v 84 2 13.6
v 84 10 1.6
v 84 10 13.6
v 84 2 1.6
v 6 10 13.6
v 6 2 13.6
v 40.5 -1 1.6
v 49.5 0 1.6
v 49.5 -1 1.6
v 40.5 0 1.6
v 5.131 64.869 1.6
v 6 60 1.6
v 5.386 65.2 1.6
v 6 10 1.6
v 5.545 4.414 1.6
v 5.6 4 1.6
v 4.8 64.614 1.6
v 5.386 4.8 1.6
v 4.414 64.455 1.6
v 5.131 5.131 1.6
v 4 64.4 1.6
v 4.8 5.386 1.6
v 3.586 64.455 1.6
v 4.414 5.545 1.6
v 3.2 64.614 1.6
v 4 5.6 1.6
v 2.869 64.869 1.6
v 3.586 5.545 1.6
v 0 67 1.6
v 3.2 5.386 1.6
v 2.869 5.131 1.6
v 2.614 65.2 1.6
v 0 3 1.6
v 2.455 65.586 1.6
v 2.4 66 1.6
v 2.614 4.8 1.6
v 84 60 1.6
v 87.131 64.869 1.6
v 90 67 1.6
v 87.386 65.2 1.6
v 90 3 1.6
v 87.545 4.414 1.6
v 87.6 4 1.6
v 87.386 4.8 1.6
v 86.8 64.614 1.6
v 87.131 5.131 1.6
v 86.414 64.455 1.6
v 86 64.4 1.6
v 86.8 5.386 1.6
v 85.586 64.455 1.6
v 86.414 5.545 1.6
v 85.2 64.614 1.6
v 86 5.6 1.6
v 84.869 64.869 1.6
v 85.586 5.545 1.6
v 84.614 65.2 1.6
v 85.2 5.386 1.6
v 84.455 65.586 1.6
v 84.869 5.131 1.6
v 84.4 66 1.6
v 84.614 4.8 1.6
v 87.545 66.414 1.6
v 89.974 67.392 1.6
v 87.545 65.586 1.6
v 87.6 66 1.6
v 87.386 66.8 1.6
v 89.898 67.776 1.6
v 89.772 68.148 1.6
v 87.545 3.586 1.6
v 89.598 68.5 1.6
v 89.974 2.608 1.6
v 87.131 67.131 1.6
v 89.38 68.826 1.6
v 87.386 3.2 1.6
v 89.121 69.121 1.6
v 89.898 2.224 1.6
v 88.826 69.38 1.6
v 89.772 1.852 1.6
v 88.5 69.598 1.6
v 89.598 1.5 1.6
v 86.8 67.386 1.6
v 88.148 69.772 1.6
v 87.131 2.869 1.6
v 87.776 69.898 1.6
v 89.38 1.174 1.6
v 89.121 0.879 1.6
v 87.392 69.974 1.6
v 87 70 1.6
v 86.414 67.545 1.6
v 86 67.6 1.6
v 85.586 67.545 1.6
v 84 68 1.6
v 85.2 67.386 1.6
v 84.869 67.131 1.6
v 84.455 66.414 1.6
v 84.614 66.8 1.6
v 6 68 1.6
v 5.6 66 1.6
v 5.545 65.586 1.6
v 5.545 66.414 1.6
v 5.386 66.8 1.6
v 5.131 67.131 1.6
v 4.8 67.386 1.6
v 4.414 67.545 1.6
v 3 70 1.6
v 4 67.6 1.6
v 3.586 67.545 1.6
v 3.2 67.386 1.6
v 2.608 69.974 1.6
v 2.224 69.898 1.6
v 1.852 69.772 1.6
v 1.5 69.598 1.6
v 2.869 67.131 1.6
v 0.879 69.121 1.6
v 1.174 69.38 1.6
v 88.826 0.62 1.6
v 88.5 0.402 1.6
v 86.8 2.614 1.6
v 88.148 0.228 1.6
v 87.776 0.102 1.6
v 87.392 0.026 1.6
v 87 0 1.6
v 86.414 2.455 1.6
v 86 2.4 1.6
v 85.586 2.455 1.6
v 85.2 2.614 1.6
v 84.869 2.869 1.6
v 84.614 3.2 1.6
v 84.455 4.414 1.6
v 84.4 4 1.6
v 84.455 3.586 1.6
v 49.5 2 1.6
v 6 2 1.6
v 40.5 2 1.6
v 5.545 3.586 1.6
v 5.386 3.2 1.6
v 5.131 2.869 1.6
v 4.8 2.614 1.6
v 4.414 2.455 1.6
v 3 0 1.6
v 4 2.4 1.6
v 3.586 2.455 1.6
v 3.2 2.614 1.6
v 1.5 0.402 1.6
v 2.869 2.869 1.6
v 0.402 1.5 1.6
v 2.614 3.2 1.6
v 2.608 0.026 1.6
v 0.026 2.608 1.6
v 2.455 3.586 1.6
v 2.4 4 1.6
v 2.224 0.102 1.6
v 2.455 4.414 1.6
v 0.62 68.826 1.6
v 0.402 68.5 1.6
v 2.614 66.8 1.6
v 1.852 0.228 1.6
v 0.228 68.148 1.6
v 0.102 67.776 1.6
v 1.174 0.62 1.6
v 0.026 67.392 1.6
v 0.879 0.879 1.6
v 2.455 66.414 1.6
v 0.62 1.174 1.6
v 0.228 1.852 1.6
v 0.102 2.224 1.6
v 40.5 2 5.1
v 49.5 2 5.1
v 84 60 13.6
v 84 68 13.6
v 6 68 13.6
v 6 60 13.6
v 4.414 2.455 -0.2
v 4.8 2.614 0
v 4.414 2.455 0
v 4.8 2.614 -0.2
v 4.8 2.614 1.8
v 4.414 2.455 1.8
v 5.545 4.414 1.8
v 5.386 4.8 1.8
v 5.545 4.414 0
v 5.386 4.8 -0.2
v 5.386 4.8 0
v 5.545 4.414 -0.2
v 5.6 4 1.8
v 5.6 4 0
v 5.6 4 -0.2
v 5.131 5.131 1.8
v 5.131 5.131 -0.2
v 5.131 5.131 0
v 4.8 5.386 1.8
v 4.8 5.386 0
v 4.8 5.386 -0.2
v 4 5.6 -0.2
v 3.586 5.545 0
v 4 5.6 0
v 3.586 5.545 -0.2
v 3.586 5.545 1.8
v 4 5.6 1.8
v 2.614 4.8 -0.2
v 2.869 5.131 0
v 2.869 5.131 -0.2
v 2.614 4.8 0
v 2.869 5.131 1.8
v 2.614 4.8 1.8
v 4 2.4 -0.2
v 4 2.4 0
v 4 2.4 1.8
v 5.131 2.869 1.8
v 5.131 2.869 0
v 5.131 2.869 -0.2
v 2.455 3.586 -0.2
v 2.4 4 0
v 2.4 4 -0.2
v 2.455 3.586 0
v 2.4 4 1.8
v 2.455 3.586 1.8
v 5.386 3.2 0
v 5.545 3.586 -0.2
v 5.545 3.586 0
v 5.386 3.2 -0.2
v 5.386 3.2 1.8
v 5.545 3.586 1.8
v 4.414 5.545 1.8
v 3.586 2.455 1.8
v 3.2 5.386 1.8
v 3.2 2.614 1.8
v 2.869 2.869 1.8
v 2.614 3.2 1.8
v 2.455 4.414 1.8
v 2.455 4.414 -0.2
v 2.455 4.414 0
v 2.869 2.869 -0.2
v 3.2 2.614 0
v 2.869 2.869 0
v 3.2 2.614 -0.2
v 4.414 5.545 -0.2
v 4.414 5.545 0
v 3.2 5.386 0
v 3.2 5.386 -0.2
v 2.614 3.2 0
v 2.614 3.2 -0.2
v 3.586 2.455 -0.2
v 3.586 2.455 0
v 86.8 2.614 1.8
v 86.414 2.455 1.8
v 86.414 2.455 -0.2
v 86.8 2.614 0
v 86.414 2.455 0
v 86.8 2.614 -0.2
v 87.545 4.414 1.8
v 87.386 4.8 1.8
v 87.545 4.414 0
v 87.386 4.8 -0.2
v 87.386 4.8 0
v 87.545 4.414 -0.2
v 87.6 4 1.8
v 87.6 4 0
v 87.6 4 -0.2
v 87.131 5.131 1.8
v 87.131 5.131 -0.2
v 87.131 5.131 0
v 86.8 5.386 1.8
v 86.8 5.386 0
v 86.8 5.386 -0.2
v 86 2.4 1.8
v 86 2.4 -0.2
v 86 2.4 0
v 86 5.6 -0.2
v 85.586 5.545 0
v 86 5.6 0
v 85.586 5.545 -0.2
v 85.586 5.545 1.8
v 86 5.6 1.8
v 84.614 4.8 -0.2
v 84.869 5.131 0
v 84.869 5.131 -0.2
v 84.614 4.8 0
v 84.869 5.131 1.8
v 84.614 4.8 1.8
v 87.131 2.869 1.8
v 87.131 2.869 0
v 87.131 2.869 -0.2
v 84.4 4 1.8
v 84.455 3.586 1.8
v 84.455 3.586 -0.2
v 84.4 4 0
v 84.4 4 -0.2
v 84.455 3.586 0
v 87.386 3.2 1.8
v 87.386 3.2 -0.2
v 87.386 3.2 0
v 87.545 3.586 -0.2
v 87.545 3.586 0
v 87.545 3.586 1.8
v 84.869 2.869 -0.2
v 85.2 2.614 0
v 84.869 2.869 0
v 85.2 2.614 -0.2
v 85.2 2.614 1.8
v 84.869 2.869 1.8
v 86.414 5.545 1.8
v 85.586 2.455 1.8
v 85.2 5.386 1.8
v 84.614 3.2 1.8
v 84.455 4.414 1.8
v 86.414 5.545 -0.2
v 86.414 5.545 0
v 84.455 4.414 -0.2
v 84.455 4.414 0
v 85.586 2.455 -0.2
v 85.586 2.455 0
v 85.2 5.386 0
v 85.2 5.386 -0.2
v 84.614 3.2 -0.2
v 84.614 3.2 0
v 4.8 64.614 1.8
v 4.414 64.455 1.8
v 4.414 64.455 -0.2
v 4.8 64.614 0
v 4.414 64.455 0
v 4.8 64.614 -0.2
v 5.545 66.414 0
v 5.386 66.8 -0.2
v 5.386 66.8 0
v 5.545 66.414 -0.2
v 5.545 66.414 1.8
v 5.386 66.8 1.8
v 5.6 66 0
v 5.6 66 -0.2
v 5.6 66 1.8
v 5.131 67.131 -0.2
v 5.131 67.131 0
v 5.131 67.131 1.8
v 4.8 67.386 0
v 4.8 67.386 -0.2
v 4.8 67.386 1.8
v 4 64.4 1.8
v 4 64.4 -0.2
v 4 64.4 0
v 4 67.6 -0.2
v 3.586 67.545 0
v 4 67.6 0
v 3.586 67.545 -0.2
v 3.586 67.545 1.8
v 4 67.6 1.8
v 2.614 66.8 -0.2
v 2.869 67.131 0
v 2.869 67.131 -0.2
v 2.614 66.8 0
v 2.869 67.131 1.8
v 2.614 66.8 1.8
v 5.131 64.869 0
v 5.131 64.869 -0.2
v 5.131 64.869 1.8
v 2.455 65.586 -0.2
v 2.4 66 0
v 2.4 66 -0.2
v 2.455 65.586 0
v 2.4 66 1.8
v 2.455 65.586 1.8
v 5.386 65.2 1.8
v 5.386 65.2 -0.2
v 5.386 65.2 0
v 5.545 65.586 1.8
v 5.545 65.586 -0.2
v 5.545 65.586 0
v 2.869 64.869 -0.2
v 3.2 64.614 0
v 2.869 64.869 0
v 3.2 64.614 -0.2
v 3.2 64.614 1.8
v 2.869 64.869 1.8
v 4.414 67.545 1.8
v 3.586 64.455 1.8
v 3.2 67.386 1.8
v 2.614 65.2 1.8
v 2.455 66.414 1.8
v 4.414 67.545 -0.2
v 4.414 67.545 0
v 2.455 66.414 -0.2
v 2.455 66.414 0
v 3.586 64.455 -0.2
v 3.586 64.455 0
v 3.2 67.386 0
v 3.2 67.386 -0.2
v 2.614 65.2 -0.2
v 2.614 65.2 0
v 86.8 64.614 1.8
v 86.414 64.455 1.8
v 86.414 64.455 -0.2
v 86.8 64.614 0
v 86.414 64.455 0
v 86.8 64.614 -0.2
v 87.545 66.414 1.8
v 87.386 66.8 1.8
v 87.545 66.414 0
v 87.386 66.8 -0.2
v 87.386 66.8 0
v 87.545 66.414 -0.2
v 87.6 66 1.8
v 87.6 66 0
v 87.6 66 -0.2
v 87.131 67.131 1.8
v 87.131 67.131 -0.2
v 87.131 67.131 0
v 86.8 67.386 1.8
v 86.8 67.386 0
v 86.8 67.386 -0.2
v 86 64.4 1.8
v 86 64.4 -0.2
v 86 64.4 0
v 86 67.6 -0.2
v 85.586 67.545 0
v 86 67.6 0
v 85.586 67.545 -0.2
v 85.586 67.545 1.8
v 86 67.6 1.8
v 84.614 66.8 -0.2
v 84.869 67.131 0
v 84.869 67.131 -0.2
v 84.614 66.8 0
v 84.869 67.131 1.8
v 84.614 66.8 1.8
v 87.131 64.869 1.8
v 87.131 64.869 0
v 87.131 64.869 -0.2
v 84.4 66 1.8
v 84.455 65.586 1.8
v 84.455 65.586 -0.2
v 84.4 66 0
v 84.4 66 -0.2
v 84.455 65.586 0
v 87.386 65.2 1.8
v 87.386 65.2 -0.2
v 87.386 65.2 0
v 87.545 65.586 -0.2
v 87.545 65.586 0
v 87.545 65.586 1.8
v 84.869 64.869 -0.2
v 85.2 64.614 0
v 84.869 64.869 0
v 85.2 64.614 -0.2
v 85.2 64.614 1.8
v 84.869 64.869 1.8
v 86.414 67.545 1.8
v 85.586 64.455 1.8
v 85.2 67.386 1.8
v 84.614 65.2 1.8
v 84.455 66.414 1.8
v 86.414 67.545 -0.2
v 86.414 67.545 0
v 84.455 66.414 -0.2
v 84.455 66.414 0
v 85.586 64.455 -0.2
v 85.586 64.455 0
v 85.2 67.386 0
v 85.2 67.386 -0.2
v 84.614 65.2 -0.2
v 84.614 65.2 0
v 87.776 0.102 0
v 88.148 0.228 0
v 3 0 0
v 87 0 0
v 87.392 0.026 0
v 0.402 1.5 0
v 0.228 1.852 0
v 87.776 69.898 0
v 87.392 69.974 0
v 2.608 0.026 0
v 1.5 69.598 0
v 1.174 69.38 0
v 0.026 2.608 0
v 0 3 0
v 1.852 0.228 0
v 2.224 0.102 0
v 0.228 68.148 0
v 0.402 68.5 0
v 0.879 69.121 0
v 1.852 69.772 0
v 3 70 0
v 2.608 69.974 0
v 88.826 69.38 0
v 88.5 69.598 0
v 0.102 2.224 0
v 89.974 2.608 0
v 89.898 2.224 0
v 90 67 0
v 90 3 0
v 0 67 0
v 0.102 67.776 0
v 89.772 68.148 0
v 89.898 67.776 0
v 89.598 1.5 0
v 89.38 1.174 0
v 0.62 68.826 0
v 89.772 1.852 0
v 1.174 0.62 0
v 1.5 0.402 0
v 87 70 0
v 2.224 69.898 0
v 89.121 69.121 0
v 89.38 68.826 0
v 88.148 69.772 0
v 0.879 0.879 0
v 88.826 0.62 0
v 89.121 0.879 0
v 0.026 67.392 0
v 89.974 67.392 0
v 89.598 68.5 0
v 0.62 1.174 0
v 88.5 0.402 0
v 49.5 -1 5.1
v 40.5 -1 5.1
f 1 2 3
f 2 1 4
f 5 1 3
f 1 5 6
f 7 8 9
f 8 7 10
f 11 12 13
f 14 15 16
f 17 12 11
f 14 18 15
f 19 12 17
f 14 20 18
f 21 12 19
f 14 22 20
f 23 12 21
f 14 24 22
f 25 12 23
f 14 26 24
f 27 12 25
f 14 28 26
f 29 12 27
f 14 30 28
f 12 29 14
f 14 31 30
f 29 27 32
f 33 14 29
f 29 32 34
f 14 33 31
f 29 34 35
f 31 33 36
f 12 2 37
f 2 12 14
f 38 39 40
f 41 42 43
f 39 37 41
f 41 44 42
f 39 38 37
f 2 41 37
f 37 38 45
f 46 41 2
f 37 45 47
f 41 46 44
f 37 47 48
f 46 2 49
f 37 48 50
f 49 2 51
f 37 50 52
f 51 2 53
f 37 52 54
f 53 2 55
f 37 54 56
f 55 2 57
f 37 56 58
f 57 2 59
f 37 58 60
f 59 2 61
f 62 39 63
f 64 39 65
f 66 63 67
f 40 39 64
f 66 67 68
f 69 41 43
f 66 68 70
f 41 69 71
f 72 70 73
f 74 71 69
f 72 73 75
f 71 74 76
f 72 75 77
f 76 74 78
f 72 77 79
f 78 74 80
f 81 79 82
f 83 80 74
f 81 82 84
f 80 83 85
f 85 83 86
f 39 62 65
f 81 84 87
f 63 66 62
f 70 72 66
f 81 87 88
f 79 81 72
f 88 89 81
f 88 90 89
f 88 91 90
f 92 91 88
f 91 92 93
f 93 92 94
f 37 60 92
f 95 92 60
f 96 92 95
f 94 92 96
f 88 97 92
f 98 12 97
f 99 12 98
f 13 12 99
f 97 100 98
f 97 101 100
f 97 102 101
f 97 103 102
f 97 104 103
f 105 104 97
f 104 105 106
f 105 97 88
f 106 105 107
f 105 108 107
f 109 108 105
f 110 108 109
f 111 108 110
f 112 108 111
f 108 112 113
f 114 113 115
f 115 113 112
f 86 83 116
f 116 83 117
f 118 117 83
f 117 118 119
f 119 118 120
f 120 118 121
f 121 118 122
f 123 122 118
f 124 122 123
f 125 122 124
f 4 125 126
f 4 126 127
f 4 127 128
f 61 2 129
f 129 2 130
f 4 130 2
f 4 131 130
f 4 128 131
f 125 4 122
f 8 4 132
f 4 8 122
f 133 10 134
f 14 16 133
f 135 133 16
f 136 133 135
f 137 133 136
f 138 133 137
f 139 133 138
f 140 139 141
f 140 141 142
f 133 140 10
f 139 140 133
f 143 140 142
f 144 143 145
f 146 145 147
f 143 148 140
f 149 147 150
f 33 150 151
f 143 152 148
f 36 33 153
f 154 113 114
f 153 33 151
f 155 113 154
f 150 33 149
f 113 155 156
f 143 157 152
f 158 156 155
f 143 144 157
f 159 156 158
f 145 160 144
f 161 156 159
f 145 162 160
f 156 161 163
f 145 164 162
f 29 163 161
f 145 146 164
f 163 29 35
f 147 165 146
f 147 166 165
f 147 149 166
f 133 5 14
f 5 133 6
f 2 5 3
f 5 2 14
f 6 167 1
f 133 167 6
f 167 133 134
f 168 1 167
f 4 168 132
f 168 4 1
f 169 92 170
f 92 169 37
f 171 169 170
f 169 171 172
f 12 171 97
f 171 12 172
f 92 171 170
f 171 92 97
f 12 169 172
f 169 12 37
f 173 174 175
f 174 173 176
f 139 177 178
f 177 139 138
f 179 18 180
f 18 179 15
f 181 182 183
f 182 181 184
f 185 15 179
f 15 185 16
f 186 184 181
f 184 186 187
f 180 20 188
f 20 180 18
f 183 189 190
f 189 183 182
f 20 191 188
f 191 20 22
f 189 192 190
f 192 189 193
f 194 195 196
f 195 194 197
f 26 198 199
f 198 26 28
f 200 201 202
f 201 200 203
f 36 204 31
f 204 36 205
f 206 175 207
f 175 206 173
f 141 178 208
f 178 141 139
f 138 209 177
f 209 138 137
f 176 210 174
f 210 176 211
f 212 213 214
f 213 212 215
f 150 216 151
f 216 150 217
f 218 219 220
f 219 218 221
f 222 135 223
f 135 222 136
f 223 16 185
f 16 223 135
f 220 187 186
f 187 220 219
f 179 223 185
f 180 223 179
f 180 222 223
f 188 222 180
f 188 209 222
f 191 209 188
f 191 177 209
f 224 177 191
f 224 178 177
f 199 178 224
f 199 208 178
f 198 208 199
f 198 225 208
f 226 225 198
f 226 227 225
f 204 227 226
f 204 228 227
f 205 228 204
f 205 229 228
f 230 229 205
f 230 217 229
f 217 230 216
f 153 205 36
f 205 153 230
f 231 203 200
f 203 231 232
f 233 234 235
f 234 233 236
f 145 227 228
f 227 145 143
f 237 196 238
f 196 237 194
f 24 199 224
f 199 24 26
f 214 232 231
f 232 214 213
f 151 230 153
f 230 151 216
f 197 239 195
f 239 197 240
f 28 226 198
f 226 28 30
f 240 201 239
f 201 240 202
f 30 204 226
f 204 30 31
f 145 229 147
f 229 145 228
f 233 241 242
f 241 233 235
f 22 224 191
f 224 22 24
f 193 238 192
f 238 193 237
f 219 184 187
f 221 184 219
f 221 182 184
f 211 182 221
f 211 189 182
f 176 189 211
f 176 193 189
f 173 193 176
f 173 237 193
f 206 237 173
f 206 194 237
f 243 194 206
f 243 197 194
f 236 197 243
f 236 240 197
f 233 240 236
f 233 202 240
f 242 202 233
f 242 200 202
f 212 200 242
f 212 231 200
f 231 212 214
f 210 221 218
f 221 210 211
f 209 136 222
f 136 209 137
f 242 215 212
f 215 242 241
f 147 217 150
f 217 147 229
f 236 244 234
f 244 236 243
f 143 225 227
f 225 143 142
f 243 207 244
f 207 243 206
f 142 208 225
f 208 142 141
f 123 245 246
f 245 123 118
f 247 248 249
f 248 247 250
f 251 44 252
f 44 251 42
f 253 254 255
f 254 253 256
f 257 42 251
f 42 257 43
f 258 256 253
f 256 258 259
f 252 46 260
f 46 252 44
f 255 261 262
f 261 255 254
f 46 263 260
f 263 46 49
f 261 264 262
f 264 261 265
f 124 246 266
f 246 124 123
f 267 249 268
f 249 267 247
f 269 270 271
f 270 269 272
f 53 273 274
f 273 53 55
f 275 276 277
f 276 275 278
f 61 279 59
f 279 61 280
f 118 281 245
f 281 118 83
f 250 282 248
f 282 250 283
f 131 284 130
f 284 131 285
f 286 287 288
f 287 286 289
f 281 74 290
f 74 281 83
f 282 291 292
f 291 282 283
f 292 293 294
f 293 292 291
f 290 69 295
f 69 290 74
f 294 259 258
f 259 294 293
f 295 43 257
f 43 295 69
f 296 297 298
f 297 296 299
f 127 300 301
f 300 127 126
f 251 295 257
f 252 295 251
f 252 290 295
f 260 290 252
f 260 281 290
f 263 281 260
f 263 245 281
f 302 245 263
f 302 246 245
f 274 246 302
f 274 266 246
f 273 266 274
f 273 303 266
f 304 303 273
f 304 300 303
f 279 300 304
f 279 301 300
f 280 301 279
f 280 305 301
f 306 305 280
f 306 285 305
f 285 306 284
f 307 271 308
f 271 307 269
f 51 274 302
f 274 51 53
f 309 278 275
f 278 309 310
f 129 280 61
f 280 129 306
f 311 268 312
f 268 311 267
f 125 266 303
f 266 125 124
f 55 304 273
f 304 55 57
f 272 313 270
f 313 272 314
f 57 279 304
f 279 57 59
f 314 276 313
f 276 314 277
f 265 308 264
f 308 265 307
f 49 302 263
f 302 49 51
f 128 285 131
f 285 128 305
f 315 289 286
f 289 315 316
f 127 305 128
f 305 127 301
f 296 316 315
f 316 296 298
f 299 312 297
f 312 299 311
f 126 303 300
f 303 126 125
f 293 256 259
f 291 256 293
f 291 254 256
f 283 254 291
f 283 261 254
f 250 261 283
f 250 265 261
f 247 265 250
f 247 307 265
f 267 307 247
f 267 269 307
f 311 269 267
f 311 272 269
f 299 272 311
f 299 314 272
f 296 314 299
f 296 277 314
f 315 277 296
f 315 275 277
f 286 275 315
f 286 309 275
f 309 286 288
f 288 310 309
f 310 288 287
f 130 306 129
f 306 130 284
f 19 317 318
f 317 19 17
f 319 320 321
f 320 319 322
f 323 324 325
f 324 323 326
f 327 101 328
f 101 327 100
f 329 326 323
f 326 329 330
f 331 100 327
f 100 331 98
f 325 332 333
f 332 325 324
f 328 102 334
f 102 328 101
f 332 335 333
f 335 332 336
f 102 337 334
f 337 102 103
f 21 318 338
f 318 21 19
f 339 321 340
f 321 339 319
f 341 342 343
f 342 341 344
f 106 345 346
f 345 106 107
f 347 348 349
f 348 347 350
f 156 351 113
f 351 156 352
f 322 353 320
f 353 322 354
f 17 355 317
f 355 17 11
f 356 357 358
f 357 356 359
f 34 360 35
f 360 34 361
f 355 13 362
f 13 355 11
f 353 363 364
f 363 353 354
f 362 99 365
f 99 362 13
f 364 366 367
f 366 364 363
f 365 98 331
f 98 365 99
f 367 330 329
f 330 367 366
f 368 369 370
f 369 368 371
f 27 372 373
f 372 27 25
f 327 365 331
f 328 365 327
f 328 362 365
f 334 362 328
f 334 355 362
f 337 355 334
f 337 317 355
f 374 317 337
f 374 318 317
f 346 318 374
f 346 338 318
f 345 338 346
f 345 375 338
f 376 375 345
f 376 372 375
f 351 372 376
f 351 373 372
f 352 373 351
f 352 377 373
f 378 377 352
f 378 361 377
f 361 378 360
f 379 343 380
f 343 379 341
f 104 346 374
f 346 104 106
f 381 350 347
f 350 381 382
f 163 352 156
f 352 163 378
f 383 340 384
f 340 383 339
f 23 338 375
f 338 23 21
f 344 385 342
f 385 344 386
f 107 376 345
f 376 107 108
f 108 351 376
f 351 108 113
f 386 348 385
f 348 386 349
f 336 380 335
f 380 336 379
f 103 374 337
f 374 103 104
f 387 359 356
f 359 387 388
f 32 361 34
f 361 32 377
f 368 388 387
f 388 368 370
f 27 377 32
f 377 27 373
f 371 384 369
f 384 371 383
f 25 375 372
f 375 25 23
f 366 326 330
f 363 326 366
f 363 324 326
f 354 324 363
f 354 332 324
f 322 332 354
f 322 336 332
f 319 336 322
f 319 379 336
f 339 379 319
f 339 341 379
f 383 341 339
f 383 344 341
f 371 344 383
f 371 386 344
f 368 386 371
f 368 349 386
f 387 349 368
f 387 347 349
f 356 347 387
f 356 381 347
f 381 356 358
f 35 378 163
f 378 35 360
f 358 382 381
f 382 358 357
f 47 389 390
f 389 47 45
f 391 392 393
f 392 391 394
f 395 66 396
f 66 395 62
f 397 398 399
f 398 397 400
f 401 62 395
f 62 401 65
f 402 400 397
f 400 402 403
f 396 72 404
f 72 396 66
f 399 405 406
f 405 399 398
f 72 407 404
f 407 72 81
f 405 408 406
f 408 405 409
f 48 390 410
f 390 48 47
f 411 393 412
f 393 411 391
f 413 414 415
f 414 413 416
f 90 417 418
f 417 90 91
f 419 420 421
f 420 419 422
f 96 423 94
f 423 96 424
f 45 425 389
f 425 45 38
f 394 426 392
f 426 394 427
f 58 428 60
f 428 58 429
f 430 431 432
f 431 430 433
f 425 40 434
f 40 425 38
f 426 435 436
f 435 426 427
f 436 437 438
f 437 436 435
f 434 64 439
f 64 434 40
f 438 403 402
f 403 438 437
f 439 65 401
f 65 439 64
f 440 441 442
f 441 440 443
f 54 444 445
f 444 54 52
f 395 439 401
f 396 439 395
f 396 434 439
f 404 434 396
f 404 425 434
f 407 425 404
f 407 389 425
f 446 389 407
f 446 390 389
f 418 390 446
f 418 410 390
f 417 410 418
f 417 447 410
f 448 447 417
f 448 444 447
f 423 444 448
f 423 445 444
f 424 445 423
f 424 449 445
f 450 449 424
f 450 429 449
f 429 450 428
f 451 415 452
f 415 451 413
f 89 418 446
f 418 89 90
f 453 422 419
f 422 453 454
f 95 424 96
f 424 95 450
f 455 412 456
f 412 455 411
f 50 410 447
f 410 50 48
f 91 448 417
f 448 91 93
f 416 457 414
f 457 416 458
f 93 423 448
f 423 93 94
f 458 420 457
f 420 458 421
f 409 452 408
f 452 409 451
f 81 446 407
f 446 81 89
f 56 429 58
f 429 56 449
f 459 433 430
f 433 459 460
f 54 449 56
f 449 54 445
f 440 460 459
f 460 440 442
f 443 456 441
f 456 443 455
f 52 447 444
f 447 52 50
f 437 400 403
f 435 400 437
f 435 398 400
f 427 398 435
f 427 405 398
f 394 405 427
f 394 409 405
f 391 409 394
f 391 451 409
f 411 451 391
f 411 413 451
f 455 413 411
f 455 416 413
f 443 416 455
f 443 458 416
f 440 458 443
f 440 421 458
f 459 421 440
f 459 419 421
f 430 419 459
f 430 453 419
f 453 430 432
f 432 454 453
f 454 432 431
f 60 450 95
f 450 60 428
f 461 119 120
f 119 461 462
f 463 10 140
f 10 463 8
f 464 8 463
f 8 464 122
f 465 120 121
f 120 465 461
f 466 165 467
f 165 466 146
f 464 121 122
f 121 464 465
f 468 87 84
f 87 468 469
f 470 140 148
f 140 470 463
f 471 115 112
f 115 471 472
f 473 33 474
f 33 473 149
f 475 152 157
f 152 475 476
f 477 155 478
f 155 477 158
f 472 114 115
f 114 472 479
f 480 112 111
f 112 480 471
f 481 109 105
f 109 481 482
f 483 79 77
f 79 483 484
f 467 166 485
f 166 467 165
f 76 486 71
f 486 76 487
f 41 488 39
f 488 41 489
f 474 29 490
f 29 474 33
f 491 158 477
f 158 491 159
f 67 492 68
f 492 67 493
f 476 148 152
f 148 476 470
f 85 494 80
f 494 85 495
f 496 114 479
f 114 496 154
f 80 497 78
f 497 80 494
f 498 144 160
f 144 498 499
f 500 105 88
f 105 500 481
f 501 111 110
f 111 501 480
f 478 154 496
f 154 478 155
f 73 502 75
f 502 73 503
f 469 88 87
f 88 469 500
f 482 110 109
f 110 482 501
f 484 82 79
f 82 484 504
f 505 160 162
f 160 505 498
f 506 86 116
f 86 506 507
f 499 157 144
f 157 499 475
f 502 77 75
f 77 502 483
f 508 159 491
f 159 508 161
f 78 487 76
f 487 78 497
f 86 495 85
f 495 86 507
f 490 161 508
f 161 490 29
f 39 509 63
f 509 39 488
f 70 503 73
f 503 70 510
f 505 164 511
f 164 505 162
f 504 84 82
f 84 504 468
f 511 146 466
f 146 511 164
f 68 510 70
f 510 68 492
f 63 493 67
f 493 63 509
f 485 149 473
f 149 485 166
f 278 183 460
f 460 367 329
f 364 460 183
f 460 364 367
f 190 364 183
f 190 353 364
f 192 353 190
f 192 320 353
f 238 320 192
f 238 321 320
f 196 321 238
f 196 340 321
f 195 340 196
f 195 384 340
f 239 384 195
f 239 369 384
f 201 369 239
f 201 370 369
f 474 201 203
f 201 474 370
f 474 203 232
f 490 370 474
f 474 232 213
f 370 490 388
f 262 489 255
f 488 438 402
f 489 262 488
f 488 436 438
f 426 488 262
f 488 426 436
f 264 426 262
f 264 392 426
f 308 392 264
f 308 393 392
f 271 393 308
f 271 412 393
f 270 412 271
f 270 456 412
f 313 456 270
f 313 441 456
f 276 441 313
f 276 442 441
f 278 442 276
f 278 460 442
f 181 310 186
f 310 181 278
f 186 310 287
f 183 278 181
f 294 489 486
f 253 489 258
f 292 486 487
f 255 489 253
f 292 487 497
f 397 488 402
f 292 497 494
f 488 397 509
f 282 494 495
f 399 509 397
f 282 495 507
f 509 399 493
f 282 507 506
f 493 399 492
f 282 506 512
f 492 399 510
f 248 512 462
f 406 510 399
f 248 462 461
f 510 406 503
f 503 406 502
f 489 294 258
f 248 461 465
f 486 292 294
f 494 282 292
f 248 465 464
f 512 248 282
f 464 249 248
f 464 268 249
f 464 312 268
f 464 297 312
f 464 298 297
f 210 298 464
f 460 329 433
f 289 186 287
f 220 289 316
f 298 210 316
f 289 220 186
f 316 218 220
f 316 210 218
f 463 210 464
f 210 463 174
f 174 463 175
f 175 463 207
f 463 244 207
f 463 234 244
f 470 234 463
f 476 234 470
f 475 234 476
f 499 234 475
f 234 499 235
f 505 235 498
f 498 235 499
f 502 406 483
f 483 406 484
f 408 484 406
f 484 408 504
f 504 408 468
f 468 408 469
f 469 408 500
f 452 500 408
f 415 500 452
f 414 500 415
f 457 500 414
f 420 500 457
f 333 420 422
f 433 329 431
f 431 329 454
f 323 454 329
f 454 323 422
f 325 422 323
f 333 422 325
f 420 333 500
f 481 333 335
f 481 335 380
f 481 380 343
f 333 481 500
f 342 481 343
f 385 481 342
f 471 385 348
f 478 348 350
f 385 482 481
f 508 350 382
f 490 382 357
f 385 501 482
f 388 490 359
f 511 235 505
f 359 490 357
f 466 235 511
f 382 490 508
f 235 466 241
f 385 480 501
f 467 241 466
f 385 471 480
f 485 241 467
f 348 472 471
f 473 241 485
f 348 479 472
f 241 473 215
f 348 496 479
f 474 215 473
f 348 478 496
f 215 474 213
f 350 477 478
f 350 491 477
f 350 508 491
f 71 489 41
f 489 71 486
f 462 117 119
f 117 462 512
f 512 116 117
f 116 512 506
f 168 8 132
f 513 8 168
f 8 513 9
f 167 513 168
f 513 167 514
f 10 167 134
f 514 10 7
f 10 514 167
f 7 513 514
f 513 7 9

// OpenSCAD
/* =============================================================================
 * 智慧香爐 — 外購元件：MATRIX Mini R4 控制器
 * =============================================================================
 * ★★ 這不是列印件，是外購品的示意模型 ★★
 * 尺寸來自 ../params.scad，★官方未公佈外形，整組為推估★（以 UNO 外型放寬）。
 * 用途：組裝干涉檢查、螺絲可及性、目視確認裝得下。
 * ★不可當成實際尺寸寫進報告★（CLAUDE.md §7）
 *
 * 原點：PCB 左下角、z=0 為板底
 * ============================================================================= */

include <../params.scad>


module matrix_r4() {
    color("#0d3b66") linear_extrude(PCB_T)
        offset(r = 3) offset(r = -3) square([MATRIX_W, MATRIX_D]);

    // 周邊埠座：四邊各一排（D1/D4、I2C、馬達埠…）。
    // ★不是實際佈局★——是「周邊被埠座佔掉多少空間」的包絡，
    //   拿到實體板請改成真實位置，否則干涉檢查會驗到錯的東西。
    color("#1a1a1a") {
        translate([6, 2, PCB_T])              cube([MATRIX_W - 12, 8, MATRIX_CONN_H]);
        translate([6, MATRIX_D - 10, PCB_T])  cube([MATRIX_W - 12, 8, MATRIX_CONN_H]);
    }
    // USB-C（供電與燒錄）——外露到板外，後面板要留孔
    color("#d0d3d6")
        translate([MATRIX_W / 2 - MATRIX_USB_W / 2, -1, PCB_T])
            cube([MATRIX_USB_W, 4, MATRIX_USB_H]);

    color("#8a8f94") for (p = MATRIX_SCREW)
        translate([p[0], p[1], -0.2]) cylinder(h = PCB_T + 0.4, d = 3.2, $fn = 24);
}

// ── 單獨開檔時的預覽（被 use<> 引入時不執行）──
matrix_r4();
